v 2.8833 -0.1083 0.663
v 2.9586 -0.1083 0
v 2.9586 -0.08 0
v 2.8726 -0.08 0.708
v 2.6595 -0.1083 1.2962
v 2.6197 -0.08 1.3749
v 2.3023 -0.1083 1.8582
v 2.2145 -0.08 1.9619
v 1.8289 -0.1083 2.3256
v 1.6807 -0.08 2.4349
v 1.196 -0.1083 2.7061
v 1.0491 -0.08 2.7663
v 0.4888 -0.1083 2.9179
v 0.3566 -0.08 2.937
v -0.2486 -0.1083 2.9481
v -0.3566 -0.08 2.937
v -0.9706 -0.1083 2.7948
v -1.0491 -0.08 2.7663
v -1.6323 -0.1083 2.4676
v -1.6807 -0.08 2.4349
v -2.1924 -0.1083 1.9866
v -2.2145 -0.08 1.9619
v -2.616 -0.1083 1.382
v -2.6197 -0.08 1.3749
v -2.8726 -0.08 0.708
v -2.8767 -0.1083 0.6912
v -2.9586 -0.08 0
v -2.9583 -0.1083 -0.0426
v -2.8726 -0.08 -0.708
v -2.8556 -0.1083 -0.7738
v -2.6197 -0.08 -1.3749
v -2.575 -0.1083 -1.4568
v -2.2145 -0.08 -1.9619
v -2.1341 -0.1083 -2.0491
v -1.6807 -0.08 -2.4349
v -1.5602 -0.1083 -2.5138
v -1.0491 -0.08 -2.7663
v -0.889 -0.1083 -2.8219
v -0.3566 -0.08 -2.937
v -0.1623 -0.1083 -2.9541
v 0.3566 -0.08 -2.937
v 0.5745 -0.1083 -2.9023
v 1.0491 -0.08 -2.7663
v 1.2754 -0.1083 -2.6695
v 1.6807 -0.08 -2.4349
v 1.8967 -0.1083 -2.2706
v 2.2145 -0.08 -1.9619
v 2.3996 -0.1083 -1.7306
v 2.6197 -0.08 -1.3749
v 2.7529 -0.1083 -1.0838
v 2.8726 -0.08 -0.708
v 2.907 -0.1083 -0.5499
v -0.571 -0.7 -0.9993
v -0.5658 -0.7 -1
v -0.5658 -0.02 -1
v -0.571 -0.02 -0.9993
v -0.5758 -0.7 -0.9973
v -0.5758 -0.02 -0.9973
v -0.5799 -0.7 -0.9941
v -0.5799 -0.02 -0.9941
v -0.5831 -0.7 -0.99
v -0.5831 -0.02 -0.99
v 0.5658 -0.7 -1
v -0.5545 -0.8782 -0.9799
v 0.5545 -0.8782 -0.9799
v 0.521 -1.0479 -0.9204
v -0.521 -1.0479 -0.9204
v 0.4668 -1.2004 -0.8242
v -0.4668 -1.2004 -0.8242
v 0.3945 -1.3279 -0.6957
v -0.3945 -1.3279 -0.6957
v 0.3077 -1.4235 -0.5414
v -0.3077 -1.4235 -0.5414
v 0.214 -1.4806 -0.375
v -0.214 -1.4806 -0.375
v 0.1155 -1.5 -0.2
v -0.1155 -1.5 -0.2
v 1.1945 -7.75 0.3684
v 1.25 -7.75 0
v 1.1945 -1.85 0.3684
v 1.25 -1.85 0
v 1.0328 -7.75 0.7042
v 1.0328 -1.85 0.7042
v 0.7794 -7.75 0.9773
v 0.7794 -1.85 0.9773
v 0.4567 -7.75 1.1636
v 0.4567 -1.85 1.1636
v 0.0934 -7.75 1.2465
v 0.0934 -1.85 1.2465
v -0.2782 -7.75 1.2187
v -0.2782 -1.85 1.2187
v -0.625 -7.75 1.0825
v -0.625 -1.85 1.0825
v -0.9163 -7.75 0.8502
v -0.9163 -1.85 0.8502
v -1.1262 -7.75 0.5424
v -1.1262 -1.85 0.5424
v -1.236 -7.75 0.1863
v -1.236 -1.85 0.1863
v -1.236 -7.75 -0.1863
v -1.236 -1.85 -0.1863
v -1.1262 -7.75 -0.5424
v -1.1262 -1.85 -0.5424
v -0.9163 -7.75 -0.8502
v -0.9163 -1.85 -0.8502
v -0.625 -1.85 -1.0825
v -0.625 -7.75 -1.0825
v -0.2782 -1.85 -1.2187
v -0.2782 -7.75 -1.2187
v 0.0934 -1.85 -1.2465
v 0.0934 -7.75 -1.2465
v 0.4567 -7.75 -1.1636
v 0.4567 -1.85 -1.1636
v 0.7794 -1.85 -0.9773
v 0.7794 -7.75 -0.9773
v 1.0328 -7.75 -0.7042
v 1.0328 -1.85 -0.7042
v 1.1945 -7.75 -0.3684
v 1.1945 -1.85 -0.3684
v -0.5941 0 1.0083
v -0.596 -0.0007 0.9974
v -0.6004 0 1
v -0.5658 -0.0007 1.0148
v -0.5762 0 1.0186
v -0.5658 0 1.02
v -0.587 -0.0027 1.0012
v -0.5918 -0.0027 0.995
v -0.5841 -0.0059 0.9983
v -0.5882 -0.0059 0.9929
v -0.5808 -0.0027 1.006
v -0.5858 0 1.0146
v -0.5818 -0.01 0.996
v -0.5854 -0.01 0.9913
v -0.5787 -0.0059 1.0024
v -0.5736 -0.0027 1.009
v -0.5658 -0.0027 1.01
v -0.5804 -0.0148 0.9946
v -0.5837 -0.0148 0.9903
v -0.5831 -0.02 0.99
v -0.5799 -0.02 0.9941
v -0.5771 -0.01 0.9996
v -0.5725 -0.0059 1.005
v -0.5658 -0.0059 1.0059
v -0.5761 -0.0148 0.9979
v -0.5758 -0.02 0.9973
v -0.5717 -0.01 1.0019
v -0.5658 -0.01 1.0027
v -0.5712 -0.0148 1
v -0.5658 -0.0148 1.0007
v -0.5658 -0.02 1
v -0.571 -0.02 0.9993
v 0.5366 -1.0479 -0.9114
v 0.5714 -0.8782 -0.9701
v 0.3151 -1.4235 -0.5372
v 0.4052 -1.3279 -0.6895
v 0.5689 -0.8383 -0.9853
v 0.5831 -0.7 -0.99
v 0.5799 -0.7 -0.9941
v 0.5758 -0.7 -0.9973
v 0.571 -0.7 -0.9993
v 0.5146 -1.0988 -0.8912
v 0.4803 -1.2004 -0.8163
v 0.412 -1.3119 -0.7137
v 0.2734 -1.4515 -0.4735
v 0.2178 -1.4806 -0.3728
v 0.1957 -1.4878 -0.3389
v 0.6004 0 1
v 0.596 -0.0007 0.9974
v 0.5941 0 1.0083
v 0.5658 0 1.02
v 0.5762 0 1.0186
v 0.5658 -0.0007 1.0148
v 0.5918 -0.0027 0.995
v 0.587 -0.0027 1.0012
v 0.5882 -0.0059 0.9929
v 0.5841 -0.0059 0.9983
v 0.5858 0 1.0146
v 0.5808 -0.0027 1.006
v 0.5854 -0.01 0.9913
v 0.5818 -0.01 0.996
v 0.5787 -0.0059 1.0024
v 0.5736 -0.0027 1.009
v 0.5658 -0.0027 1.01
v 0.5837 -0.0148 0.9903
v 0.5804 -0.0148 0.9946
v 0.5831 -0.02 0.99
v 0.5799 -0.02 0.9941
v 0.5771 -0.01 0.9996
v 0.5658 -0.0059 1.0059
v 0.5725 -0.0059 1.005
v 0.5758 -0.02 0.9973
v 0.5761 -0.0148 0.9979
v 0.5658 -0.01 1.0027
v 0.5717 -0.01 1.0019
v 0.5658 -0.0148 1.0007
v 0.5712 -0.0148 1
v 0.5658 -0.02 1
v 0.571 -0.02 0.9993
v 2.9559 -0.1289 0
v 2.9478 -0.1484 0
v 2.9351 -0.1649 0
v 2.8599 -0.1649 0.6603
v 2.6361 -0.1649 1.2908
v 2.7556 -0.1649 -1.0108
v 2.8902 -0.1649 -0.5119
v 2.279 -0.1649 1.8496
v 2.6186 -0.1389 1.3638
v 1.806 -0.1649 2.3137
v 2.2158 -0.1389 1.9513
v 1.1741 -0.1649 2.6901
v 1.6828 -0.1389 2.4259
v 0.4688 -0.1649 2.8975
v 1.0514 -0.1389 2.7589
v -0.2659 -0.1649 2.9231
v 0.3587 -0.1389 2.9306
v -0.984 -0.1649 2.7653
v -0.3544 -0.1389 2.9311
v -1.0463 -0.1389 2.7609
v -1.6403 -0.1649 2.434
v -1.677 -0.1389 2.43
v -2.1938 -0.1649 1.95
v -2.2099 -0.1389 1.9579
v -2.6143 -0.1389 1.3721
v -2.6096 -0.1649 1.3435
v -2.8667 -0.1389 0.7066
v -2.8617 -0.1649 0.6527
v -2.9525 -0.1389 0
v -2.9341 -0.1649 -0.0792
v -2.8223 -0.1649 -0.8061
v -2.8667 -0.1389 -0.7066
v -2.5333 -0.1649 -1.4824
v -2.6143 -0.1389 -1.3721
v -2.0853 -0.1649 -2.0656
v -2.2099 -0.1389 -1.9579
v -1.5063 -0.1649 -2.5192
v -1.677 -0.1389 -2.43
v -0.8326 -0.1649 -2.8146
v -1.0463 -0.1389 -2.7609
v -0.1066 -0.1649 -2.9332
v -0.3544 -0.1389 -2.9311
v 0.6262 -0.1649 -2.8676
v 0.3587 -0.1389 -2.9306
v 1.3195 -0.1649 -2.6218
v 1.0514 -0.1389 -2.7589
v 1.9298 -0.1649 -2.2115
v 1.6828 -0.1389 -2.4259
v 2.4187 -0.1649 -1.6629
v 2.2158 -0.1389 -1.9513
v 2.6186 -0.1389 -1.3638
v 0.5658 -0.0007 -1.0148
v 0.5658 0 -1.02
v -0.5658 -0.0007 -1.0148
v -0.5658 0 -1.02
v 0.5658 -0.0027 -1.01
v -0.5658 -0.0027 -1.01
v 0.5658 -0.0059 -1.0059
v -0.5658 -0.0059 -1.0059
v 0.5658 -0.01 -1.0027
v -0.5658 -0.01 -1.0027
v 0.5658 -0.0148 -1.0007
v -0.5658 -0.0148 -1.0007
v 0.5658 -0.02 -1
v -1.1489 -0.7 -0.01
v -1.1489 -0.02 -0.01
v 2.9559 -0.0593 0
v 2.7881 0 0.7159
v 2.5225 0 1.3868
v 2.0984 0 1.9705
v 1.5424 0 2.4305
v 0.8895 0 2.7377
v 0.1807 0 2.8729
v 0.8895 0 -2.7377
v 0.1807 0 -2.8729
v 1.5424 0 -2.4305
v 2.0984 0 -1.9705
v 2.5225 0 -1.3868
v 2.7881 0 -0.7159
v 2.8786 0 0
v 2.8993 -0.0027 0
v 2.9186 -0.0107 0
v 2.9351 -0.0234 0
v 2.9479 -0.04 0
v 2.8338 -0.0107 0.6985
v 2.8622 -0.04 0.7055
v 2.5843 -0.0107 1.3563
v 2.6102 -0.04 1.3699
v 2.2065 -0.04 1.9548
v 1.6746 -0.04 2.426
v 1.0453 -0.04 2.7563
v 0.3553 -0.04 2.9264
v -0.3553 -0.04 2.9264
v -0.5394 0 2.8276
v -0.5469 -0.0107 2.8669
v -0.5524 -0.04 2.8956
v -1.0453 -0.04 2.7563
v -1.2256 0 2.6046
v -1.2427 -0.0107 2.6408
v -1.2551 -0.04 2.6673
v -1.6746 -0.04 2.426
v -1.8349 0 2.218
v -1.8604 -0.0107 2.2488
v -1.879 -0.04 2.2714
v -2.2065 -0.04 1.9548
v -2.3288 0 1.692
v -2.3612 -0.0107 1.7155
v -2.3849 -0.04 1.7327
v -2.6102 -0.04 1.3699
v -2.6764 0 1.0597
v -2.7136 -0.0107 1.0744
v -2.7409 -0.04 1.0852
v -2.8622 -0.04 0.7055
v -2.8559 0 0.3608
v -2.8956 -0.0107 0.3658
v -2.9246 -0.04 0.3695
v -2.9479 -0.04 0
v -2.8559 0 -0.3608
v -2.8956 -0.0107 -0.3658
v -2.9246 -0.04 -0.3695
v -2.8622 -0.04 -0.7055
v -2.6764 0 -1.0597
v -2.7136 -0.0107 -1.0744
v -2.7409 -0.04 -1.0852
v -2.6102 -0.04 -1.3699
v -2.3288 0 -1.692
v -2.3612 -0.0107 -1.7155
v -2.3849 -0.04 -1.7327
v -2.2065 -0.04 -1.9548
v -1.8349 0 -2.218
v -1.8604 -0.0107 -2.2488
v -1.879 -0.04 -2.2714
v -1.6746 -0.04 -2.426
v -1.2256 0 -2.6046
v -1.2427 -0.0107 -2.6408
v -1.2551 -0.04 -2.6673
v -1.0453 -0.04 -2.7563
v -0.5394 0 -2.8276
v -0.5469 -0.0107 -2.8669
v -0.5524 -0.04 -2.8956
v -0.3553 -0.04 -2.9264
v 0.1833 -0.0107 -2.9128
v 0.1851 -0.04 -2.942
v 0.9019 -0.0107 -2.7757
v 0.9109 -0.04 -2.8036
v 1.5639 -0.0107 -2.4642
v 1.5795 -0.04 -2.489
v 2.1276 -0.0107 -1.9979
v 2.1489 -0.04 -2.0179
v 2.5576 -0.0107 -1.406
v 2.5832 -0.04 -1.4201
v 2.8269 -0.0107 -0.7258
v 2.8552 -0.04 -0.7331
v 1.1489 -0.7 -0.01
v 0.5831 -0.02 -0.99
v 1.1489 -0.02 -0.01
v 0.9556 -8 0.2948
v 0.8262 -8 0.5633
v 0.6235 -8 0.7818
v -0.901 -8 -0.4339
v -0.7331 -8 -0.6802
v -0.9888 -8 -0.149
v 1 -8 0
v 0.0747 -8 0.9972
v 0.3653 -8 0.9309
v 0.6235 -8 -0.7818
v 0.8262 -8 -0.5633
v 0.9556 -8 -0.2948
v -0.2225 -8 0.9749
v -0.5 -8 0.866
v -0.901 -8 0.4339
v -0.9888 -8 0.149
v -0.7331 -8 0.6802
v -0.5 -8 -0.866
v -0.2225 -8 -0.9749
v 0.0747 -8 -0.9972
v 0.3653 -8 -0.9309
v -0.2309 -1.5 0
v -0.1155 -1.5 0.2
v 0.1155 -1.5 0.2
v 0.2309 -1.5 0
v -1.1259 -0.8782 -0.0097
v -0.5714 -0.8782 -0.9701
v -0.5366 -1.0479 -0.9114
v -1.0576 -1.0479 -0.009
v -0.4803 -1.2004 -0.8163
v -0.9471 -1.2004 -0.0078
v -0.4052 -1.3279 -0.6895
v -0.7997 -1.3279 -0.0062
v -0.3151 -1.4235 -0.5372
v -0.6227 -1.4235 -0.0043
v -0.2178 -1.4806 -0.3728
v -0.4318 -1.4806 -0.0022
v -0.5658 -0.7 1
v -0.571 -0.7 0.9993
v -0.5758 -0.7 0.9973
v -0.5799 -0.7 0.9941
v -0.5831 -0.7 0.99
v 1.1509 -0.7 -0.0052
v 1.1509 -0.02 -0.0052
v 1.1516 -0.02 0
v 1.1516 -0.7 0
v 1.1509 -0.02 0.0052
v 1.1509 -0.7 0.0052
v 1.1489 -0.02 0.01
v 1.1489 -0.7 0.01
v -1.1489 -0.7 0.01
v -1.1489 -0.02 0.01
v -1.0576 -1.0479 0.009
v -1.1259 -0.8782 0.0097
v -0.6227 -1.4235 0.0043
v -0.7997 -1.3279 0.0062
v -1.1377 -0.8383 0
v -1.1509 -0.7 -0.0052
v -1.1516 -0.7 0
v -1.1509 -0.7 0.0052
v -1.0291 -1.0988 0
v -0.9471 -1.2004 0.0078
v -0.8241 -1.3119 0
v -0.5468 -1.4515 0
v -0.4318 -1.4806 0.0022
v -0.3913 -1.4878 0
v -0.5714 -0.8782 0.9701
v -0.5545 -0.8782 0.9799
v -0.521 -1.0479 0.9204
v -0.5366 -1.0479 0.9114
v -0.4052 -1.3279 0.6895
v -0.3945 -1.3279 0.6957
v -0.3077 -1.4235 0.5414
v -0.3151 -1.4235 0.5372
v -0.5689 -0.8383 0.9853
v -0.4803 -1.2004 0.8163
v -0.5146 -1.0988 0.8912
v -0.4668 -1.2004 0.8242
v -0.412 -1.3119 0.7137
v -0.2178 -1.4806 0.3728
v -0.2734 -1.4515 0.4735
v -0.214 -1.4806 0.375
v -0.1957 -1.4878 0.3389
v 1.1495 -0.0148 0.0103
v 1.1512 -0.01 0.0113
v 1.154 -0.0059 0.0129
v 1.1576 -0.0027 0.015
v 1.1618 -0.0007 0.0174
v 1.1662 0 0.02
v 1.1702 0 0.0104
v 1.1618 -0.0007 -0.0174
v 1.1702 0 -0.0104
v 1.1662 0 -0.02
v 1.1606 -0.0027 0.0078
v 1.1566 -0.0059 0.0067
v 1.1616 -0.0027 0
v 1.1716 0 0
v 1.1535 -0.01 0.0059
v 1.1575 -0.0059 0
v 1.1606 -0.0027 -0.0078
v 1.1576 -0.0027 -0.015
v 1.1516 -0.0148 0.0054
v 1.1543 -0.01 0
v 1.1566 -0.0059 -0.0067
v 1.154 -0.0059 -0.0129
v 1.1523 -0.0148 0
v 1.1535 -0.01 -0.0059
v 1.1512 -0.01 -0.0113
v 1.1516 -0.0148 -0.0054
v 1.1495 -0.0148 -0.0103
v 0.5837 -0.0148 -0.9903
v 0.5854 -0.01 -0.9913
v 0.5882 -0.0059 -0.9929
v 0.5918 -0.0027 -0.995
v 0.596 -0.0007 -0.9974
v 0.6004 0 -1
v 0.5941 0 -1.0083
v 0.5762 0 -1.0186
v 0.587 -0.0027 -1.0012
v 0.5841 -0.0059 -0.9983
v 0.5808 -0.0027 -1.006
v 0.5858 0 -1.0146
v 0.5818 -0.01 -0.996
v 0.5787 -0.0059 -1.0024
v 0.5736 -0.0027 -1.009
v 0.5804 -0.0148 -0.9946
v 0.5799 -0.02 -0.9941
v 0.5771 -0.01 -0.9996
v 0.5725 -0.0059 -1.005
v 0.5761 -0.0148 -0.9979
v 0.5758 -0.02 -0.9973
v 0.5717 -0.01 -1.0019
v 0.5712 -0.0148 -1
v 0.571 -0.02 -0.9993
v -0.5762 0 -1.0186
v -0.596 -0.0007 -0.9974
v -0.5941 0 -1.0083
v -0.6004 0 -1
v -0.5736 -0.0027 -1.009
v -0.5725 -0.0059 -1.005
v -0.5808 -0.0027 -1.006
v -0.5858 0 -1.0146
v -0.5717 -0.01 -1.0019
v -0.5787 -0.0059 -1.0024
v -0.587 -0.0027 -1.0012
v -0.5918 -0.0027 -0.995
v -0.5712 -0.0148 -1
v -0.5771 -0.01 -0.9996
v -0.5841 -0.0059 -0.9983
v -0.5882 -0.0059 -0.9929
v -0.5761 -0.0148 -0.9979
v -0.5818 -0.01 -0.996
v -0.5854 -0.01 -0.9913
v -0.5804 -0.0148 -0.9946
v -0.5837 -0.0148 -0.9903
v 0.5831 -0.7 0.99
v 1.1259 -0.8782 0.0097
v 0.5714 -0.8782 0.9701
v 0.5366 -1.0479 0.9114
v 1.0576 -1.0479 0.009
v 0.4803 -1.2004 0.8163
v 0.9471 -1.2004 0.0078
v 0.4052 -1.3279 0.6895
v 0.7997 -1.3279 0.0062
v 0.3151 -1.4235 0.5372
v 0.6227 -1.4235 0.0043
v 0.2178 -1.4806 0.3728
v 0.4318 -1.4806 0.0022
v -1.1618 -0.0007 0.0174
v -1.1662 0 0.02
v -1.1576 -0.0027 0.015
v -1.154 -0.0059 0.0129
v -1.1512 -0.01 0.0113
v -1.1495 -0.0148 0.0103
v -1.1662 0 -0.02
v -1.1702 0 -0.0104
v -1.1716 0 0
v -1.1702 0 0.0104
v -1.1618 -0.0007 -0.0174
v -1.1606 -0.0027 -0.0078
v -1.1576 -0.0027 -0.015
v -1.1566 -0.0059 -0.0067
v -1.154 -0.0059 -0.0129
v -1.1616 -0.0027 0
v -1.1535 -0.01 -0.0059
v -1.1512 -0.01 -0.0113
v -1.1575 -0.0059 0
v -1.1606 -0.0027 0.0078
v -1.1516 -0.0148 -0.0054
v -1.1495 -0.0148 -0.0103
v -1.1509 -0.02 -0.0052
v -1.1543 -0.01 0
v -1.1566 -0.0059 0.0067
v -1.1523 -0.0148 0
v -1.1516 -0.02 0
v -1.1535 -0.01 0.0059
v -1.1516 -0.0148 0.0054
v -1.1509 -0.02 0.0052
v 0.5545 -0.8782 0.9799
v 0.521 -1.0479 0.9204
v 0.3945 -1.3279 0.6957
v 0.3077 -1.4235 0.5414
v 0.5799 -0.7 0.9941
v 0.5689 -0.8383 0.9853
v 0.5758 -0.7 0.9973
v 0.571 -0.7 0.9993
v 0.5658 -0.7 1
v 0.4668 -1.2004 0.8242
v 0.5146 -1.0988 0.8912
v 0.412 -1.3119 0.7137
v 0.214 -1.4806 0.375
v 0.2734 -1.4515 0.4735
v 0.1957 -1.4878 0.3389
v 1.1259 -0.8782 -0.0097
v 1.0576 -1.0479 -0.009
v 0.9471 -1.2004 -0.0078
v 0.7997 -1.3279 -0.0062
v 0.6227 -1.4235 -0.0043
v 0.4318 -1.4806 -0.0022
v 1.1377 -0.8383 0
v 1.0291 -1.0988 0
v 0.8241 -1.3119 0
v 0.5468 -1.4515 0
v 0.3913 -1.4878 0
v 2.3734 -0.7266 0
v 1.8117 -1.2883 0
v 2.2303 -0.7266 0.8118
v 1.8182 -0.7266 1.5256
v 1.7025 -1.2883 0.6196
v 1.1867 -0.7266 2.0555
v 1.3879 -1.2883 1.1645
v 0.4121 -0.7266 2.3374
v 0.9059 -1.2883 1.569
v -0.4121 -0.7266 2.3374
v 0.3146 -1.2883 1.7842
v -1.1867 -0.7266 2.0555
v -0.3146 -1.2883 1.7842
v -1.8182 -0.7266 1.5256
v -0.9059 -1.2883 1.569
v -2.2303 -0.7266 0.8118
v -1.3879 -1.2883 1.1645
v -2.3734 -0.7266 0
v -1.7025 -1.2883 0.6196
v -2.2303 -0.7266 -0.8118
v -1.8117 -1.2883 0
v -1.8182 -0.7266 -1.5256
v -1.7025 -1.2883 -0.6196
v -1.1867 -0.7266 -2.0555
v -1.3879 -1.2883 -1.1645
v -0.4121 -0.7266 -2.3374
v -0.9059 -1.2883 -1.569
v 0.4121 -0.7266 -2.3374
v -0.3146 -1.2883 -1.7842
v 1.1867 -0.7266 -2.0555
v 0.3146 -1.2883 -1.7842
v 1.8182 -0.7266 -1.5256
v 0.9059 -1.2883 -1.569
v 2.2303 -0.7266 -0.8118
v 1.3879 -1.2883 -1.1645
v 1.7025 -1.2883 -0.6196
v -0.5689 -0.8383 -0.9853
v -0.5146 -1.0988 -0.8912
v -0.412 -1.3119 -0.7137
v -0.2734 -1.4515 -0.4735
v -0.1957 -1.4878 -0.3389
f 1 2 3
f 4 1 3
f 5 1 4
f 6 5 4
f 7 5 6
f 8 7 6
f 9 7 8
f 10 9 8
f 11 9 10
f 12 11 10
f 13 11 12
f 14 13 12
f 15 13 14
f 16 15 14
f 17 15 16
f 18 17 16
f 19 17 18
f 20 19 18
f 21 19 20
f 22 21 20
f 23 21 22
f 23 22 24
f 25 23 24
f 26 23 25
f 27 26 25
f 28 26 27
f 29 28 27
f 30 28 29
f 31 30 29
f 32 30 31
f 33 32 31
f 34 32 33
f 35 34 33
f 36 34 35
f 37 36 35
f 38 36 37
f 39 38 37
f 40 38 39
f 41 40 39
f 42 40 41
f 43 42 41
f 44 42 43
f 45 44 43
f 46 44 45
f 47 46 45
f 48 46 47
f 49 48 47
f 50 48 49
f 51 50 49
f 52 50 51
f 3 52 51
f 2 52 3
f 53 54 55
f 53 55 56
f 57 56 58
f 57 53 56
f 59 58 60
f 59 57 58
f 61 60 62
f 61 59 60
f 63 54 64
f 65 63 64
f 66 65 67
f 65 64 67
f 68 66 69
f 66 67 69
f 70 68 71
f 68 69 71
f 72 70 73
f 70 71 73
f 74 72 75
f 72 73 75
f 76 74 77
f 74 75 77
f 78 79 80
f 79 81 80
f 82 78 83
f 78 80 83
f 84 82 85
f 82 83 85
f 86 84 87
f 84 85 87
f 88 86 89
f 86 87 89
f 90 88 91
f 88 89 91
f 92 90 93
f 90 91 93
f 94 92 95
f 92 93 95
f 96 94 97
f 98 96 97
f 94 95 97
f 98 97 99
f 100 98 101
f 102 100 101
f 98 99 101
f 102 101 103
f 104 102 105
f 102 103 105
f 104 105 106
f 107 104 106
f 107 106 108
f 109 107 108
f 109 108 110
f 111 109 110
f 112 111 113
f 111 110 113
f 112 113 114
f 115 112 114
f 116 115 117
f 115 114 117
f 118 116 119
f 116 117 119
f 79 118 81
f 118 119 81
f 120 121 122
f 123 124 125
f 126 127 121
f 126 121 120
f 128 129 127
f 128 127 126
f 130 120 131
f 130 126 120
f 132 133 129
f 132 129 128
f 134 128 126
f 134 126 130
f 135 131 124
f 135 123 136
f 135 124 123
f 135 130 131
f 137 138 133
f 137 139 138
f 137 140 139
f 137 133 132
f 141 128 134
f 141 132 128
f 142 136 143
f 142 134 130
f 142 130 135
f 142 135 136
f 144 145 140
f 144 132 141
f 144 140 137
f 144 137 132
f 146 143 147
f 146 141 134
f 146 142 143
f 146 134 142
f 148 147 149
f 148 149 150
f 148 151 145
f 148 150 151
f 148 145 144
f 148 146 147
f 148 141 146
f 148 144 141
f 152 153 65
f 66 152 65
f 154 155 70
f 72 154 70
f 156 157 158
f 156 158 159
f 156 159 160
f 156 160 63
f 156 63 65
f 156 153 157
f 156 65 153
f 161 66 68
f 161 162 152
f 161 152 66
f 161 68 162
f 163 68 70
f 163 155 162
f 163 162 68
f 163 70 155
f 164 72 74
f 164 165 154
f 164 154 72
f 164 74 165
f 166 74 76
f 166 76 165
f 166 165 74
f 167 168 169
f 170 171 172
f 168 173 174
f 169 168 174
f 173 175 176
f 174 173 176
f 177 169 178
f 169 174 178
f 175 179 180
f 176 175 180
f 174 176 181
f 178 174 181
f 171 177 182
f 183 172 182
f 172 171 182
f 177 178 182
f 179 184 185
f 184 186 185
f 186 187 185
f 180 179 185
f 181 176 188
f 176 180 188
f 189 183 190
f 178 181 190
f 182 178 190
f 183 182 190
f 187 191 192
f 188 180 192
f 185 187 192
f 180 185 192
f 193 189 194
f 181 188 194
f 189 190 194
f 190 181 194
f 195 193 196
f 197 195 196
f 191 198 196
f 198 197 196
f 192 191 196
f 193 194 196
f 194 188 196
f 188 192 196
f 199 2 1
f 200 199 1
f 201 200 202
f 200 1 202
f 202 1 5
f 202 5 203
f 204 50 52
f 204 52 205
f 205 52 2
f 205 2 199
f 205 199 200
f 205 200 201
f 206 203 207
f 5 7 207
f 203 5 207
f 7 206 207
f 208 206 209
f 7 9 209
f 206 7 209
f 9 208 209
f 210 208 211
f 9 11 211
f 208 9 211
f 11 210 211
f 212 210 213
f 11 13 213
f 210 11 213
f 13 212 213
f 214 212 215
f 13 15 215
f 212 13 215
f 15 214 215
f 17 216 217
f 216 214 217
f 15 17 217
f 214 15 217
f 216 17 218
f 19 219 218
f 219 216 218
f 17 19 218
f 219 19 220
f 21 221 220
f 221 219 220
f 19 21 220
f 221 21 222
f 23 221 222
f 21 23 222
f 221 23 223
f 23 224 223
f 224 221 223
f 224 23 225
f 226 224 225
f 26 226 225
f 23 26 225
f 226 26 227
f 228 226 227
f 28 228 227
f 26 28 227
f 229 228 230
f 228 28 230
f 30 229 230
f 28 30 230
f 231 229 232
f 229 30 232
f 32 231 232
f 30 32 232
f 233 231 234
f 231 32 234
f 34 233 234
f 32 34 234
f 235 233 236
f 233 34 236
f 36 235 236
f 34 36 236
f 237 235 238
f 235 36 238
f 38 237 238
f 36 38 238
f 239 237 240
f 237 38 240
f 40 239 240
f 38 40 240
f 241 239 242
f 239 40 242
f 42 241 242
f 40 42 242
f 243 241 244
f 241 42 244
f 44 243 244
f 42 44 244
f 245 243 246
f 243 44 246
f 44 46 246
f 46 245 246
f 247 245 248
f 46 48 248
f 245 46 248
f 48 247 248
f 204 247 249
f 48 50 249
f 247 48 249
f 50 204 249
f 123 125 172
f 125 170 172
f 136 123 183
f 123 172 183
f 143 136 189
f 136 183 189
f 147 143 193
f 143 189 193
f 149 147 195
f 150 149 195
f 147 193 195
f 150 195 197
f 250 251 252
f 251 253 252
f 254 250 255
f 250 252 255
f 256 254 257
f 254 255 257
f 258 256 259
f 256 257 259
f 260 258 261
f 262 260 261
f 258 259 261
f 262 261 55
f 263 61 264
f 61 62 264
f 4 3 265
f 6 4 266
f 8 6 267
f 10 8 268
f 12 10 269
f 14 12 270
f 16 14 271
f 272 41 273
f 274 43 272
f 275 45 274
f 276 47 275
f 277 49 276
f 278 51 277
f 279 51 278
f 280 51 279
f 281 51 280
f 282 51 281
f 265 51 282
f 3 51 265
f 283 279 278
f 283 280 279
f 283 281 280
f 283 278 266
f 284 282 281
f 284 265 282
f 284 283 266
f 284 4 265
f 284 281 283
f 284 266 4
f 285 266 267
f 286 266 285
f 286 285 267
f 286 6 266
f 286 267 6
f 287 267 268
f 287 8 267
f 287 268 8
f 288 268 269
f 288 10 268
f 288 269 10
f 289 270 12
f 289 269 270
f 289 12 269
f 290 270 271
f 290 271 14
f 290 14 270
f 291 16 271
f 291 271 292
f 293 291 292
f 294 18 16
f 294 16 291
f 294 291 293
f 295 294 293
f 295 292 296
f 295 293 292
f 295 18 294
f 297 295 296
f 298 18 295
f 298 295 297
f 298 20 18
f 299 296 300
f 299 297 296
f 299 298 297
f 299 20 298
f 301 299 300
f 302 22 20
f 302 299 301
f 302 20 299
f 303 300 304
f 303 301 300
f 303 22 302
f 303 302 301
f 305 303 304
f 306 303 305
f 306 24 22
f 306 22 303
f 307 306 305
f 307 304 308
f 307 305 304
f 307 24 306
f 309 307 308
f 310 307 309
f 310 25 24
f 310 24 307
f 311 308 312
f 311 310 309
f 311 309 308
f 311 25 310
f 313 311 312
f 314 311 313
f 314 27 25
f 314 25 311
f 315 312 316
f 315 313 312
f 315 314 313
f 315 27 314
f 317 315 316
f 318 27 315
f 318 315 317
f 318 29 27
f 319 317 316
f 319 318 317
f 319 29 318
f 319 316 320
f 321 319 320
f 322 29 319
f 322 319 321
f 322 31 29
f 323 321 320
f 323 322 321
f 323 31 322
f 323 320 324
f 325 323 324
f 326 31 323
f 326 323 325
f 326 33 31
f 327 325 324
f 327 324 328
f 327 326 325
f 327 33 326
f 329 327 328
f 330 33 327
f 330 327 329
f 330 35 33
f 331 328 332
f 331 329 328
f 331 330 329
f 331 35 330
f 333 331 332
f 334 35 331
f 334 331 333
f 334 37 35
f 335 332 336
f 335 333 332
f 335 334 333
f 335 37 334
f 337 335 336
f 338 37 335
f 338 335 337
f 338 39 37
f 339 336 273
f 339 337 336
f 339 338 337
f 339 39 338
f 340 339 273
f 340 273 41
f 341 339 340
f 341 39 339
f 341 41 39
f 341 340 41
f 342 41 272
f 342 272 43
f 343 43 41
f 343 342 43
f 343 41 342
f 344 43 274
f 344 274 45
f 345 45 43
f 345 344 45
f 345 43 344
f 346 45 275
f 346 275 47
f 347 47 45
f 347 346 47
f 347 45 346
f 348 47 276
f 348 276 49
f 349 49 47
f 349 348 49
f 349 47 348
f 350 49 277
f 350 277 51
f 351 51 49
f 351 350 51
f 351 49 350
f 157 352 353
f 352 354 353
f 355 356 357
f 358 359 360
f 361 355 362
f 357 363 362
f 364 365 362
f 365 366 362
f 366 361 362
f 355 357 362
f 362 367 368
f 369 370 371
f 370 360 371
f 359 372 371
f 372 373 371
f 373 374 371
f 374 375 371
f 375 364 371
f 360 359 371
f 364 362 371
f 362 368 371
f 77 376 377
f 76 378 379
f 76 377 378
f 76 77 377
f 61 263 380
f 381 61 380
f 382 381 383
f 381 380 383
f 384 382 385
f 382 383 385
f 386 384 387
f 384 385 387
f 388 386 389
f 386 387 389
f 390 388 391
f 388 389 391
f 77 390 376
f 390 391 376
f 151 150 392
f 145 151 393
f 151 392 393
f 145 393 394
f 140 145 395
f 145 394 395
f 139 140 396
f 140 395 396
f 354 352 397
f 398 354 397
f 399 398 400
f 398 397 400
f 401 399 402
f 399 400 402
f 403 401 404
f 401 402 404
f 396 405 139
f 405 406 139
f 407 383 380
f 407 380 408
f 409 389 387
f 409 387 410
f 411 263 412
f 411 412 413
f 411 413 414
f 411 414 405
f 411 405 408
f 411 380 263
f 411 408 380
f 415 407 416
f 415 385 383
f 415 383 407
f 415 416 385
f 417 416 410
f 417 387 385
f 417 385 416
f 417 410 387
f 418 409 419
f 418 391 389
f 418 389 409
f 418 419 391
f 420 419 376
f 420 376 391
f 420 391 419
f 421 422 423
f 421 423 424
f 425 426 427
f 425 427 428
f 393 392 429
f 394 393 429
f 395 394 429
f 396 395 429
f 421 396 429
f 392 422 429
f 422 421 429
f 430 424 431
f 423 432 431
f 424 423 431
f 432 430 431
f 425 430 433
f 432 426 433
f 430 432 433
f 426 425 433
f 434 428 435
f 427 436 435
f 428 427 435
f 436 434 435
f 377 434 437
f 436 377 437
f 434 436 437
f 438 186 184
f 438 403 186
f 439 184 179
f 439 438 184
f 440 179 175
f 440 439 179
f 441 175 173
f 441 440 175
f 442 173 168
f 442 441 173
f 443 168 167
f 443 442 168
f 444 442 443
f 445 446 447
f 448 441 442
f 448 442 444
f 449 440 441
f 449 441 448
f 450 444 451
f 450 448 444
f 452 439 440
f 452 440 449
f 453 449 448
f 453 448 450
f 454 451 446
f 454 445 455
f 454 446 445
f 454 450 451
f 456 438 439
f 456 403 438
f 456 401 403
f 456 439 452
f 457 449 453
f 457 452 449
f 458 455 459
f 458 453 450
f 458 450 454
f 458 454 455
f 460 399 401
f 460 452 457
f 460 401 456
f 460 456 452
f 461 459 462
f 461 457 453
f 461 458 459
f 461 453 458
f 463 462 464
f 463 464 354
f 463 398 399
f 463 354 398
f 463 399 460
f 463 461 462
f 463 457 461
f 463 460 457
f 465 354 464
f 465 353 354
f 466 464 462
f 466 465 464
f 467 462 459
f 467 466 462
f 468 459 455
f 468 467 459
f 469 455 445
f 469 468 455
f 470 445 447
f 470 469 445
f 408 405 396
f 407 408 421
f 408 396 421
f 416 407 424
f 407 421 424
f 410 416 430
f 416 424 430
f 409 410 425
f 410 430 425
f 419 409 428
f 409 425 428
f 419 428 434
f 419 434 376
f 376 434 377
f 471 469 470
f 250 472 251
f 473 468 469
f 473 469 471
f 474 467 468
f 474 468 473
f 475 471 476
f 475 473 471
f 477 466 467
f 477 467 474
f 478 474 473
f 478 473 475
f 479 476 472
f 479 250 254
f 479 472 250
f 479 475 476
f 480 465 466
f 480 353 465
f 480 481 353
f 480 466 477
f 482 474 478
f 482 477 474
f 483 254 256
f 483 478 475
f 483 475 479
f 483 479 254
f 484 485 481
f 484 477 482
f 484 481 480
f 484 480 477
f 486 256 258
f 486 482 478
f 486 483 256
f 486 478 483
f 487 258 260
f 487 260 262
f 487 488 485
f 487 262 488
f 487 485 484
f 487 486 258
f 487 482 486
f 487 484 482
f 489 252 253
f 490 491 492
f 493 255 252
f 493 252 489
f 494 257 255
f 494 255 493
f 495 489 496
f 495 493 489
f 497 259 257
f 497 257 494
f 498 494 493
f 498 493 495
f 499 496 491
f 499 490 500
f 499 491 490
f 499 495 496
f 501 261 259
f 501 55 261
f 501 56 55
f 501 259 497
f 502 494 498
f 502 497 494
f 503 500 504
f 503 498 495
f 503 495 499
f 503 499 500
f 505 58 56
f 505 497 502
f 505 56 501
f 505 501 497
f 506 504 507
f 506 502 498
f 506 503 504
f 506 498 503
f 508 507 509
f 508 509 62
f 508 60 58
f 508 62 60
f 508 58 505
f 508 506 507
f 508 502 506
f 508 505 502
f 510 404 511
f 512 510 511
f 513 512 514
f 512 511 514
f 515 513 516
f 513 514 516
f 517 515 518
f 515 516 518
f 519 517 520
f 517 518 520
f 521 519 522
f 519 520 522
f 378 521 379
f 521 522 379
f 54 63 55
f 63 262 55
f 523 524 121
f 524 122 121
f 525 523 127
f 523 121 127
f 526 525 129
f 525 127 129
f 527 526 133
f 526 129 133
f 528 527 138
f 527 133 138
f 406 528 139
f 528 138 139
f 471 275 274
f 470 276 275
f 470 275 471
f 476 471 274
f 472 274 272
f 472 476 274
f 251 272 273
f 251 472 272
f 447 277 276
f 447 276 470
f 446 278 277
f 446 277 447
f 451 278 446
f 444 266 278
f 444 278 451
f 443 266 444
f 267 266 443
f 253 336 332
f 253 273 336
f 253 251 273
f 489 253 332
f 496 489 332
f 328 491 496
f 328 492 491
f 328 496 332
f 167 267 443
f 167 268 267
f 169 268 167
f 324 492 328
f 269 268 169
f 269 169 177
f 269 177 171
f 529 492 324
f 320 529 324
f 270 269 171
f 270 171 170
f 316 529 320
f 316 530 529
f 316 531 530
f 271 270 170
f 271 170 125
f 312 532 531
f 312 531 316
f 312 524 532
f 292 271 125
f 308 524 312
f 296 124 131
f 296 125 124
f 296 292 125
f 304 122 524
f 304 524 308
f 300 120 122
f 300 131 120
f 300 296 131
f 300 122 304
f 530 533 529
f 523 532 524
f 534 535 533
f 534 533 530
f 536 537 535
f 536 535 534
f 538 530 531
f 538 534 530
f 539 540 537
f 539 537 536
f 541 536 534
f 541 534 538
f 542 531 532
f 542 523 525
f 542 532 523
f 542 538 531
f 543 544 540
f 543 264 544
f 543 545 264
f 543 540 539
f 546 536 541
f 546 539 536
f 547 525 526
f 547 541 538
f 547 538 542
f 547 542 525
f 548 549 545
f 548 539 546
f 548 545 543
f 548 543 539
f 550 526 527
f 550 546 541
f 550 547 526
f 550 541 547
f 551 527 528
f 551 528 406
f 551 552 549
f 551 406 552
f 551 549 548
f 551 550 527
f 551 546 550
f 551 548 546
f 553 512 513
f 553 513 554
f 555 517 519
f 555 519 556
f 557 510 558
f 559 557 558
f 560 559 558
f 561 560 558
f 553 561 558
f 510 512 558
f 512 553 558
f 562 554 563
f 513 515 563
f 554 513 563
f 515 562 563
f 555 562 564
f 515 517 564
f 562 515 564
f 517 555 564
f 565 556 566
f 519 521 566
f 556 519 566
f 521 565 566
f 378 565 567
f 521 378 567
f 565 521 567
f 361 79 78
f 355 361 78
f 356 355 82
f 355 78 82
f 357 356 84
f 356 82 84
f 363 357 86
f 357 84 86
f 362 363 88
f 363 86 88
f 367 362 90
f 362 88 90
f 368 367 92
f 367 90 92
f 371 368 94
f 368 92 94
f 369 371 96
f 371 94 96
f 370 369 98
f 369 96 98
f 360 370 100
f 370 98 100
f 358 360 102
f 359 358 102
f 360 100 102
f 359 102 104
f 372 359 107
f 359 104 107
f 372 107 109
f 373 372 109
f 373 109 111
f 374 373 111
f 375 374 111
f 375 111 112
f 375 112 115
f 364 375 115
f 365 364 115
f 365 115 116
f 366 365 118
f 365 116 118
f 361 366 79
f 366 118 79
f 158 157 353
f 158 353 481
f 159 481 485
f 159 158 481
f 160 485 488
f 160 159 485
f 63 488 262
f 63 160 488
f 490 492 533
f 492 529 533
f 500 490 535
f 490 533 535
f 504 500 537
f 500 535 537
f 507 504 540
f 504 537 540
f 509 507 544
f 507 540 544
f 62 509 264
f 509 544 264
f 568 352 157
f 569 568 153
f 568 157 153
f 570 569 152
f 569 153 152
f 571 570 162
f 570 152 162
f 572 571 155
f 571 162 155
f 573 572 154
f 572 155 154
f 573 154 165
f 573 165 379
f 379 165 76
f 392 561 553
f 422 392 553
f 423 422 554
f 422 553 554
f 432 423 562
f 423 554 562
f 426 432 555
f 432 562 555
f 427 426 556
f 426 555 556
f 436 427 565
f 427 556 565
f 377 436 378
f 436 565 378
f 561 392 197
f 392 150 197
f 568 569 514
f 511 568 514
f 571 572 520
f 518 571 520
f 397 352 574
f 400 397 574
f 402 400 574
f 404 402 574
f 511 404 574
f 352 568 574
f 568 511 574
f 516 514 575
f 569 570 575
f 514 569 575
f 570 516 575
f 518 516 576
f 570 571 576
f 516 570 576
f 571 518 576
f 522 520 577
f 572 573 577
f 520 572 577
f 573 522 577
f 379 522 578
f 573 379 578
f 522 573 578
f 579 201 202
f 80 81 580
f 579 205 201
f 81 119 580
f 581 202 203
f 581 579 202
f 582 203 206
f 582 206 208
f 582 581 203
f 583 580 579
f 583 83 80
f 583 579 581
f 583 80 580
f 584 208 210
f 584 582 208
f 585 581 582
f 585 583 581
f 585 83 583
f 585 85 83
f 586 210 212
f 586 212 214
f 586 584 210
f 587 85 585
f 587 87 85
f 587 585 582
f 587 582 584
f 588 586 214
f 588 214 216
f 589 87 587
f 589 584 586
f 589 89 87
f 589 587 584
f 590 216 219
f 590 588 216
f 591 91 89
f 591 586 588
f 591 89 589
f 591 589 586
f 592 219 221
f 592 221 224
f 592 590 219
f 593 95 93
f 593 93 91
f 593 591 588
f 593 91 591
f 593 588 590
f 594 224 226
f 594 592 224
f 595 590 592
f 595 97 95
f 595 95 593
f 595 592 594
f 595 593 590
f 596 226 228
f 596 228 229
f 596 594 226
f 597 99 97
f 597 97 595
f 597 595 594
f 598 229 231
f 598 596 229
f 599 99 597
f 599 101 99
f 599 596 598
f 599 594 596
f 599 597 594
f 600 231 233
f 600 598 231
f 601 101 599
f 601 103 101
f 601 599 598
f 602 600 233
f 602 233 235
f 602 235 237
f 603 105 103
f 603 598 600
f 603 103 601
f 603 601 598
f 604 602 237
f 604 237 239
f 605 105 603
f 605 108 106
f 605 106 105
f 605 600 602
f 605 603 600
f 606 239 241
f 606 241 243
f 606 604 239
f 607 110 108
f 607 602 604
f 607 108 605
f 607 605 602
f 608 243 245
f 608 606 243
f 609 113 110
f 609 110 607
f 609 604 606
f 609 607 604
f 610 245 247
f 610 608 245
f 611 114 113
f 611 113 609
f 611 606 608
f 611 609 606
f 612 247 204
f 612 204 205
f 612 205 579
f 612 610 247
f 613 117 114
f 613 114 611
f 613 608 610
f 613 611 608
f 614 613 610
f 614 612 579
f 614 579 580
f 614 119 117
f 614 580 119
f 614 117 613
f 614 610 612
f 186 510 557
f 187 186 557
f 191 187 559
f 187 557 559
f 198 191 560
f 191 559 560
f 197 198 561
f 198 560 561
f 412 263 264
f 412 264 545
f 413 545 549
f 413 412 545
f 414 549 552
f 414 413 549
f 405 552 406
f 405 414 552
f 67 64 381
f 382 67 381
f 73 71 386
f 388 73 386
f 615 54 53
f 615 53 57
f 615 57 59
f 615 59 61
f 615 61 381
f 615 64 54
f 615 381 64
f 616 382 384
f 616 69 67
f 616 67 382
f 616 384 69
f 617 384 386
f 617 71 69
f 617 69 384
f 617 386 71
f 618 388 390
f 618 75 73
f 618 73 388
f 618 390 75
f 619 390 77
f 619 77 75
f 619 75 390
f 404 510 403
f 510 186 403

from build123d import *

# Parameters (mm, degrees)
SKETCH8_W          = 1.25
SKETCH8_H          = 8
CHAMFER1_SIZE      = 0.25
CHAMFER2_SIZE2     = 0.2
CHAMFER2_SIZE      = 0.141421
FILLET1_R          = 0.08
CUT_EXTRUDE1_DEPTH = 1.5
FILLET2_R          = 0.8
FILLET5_R          = 0.02


with BuildPart() as part:
    # Sketch8 → Revolve1 (revolve)
    with BuildSketch(Plane.XY):
        with Locations((0.625, -4)):
            Rectangle(SKETCH8_W, SKETCH8_H)
    revolve(axis=Axis((0, 0, 0), (0, -1, 0)))

    # Chamfer1
    chamfer1_edges = [part.edges().sort_by_distance(p)[0] for p in [
        (-1.25, -8, 0),
    ]]
    chamfer(chamfer1_edges, length=CHAMFER1_SIZE)

    # Sketch13 → Revolve2 (revolve)
    with BuildSketch(Plane.XY):
        Polygon((0, 0), (3.1, 0), (0, -3.1), align=None)
    revolve(axis=Axis((0, 0, 0), (0, -1, 0)))

    # Chamfer2
    chamfer2_edges = [part.edges().sort_by_distance(p)[0] for p in [
        (-3.1, 0, 0),
    ]]
    chamfer(chamfer2_edges, length=CHAMFER2_SIZE, length2=CHAMFER2_SIZE2)

    # Fillet1
    fillet1_edges = [part.edges().sort_by_distance(p)[0] for p in [
        (-2.958578, 0, 0),
        (-2.958578, -0.141421, 0),
    ]]
    fillet(fillet1_edges, radius=FILLET1_R)

    # Sketch14 → Cut-Extrude1 (cut)
    with BuildSketch(Plane(origin=(0, 0, 0), x_dir=(1, 0, 0), z_dir=(0, 1, 0))):
        Polygon((1.154701, 0), (0.57735, 1), (-0.57735, 1), (-1.154701, 0), (-0.57735, -1), (0.57735, -1), align=None)
    extrude(amount=-CUT_EXTRUDE1_DEPTH, mode=Mode.SUBTRACT)

    # Fillet2
    fillet2_edges = [part.edges().sort_by_distance(p)[0] for p in [
        (0.866025, -1.5, 0.5),
        (0, -1.5, 1),
        (-0.866025, -1.5, 0.5),
        (-0.866025, -1.5, -0.5),
        (0, -1.5, -1),
        (0.866025, -1.5, -0.5),
    ]]
    fillet(fillet2_edges, radius=FILLET2_R)

    # Fillet5
    fillet5_edges = [part.edges().sort_by_distance(p)[0] for p in [
        (0.866025, 0, 0.5),
        (0.866025, 0, -0.5),
        (0, 0, -1),
        (-0.866025, 0, -0.5),
        (-0.866025, 0, 0.5),
        (0, 0, 1),
        (0.57735, -0.35, 1),
        (-0.57735, -0.35, 1),
        (-1.154701, -0.35, 0),
        (-0.57735, -0.35, -1),
        (0.57735, -0.35, -1),
        (1.154701, -0.35, 0),
        (-0.430209, -1.285507, -0.745143),
        (0.430209, -1.285507, -0.745143),
        (-0.860417, -1.285507, 0),
        (0.860417, -1.285507, 0),
        (-0.430209, -1.285507, 0.745143),
        (0.430209, -1.285507, 0.745143),
    ]]
    fillet(fillet5_edges, radius=FILLET5_R)


solid = part.part
